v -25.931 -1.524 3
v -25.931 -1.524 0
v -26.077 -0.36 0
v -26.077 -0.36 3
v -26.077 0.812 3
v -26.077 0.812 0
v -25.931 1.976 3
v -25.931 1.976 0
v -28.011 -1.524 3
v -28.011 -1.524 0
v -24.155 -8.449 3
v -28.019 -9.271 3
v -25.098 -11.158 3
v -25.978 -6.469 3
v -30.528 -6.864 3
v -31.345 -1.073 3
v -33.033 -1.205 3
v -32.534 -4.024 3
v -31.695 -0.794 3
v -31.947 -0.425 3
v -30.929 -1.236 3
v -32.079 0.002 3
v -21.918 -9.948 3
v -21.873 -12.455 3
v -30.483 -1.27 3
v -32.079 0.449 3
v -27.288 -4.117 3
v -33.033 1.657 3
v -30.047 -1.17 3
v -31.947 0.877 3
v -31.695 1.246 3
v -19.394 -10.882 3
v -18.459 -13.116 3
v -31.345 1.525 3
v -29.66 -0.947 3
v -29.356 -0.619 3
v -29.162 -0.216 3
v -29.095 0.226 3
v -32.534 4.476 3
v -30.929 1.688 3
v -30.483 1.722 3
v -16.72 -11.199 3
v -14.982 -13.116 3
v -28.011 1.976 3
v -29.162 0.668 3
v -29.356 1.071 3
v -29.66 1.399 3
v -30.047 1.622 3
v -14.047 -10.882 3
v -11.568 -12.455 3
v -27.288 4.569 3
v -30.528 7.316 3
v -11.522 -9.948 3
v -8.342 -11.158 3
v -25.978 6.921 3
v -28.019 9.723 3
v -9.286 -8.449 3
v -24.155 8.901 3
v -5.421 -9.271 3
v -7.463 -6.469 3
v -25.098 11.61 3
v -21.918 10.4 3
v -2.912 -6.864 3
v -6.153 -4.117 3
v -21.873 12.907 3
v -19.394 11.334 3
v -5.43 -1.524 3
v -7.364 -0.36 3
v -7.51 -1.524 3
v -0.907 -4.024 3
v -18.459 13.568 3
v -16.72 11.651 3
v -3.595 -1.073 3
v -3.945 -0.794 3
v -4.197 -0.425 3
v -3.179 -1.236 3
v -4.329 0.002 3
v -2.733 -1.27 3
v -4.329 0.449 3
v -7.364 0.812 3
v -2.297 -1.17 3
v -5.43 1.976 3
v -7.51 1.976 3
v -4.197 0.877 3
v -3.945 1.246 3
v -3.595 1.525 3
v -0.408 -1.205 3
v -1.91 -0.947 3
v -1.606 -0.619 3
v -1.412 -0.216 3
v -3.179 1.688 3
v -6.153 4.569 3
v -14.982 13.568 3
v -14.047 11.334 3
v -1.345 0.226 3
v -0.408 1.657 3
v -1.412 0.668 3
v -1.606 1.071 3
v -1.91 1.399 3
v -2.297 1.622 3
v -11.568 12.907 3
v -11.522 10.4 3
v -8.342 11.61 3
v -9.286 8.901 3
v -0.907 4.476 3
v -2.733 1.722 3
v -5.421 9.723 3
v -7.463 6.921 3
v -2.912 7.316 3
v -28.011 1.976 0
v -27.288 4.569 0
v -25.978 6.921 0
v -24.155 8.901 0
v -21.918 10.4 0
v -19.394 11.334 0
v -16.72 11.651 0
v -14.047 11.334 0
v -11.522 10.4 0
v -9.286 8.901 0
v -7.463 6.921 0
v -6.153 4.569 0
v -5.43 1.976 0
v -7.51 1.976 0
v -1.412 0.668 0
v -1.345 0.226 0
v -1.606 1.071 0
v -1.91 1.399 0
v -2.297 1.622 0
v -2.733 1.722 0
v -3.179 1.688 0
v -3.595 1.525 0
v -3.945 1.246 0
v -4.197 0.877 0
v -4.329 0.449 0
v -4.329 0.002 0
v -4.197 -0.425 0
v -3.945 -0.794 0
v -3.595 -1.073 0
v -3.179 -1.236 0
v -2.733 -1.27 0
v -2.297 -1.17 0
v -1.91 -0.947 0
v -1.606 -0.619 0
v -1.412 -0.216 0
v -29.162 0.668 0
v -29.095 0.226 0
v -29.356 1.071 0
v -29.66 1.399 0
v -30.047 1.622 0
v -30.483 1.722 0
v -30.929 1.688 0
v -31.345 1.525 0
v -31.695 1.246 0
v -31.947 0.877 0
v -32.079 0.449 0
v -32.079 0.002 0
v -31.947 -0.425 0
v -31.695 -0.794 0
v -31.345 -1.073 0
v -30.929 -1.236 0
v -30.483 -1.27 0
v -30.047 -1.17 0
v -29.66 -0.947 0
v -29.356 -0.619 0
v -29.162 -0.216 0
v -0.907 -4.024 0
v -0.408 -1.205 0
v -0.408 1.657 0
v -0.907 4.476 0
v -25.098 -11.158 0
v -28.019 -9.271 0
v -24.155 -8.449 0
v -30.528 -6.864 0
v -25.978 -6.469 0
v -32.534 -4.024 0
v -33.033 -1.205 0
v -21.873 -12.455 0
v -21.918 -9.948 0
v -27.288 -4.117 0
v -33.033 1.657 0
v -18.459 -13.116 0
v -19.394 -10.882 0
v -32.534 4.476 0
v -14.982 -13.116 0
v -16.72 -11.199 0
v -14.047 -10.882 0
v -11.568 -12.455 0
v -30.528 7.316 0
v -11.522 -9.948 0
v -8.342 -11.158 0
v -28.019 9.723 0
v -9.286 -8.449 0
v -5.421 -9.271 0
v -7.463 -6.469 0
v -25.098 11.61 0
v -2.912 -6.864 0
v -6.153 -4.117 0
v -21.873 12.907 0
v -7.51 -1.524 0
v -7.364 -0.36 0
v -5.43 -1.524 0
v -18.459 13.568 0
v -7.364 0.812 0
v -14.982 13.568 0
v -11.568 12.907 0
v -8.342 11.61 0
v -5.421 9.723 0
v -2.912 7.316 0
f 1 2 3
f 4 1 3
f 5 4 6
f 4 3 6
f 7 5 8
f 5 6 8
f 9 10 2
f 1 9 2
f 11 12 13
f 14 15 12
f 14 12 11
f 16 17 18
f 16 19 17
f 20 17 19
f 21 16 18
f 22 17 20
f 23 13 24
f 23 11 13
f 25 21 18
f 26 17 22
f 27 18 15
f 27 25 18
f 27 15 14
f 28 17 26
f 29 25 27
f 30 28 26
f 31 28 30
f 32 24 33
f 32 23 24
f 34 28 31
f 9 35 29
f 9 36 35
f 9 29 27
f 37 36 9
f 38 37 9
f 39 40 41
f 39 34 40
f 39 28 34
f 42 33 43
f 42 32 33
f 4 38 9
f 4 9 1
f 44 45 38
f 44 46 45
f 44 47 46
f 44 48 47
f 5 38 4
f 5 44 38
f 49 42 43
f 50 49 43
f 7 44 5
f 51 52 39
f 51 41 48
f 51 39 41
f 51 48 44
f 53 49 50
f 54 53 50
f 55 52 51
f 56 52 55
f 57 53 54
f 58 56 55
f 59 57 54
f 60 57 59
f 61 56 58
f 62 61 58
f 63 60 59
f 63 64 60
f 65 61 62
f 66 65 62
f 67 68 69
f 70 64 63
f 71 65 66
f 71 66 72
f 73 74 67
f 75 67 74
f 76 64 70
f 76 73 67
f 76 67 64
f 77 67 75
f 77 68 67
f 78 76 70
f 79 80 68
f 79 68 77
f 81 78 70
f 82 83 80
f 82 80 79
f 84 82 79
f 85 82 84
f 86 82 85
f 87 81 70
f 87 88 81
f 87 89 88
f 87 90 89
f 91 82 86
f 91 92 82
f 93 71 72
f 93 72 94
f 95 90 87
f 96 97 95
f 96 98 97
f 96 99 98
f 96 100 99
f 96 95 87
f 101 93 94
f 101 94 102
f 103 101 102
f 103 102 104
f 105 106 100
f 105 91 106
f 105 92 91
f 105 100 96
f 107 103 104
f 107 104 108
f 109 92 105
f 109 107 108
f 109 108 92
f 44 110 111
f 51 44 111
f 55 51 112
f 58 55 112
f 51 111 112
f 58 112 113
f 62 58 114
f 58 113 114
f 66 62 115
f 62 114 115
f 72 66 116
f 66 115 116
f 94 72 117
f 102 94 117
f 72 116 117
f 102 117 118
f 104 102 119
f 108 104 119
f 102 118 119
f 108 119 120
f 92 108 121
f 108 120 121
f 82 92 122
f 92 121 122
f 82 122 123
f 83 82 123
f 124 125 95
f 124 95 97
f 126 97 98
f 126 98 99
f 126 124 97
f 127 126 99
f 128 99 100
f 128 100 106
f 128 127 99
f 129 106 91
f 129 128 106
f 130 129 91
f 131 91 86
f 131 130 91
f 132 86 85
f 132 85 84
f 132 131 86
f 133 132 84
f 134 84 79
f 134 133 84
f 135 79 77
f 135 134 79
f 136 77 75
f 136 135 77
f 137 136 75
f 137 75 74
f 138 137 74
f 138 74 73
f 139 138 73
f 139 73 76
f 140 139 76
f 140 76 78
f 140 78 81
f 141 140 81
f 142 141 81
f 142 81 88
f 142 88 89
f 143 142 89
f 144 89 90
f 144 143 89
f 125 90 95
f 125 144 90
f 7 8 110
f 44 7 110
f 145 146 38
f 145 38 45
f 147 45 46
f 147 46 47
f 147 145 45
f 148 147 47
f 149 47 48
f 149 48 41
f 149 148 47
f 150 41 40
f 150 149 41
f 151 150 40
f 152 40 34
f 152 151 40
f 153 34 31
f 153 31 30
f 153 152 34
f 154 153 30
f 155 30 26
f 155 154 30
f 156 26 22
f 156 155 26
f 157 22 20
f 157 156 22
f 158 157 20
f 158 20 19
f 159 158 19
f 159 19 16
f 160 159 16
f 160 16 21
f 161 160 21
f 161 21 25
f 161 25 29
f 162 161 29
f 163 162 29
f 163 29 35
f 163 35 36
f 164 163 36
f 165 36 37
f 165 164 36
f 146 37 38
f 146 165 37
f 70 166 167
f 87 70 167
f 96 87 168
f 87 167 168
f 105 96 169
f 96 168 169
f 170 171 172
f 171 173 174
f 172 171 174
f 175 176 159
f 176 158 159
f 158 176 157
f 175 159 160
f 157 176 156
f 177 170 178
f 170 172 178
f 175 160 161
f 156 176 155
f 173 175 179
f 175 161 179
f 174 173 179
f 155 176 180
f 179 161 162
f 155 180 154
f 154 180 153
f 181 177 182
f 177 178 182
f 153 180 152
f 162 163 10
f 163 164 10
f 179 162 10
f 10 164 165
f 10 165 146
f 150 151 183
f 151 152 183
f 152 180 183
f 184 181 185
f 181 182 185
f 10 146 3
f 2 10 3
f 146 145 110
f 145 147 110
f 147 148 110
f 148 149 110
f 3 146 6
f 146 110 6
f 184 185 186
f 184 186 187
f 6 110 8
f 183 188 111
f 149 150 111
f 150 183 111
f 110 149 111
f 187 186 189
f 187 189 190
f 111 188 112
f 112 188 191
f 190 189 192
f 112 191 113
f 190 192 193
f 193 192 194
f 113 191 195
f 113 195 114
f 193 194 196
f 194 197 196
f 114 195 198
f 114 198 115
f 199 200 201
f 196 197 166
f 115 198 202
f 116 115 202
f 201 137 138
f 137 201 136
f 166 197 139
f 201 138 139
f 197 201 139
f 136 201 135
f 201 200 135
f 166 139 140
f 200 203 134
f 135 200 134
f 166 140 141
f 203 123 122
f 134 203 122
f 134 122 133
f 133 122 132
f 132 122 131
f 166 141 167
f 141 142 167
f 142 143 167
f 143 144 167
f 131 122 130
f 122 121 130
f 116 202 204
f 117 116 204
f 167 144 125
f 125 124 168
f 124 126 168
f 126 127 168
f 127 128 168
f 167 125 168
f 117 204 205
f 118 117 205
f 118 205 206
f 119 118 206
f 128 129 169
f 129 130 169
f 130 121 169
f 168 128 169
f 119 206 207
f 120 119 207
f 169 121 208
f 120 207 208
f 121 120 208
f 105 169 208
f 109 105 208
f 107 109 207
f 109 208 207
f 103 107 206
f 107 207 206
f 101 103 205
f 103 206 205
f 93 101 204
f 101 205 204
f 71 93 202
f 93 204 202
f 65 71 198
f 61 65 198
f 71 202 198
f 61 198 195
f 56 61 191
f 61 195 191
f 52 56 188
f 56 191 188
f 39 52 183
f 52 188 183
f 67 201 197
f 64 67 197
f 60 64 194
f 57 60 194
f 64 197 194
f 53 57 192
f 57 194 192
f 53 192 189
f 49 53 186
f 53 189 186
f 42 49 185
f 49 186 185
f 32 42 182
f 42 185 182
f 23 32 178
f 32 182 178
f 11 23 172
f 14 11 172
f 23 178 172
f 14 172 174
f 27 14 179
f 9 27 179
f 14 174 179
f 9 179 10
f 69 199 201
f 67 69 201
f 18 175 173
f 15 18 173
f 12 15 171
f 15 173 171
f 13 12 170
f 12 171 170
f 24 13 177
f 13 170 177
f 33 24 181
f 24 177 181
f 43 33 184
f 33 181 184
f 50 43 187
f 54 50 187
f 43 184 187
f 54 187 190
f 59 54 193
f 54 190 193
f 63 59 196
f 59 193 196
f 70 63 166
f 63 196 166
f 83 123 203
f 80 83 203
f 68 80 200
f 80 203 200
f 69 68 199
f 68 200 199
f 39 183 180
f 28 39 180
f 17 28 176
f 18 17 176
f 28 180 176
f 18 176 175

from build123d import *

# Parameters (mm, degrees)
SKETCH1_R           = 1.5
BOSS_EXTRUDE1_DEPTH = 3


with BuildPart() as part:
    # Sketch1 → Boss-Extrude1 (new body)
    with BuildSketch(Plane.XY):
        with BuildLine():
            ThreePointArc((-32.534155724, 4.476054283), (-33.095330262, 0.22593084), (-32.534155724, -4.024192603))
            ThreePointArc((-32.534155724, -4.024192603), (-16.720330262, -13.19906916), (-0.906504801, -4.024192603))
            ThreePointArc((-0.906504801, -4.024192603), (-0.345330262, 0.22593084), (-0.906504801, 4.476054283))
            ThreePointArc((-0.906504801, 4.476054283), (-16.720330262, 13.65093084), (-32.534155724, 4.476054283))
        make_face()
        with Locations((-2.845330262, 0.22593084)):
            Circle(SKETCH1_R, mode=Mode.SUBTRACT)
        with Locations((-30.595330262, 0.22593084)):
            Circle(SKETCH1_R, mode=Mode.SUBTRACT)
        with BuildLine():
            Line((-28.010508516, -1.52406916), (-25.930548772, -1.52406916))
            ThreePointArc((-25.930548772, -1.52406916), (-26.095330262, 0.22593084), (-25.930548772, 1.97593084))
            Line((-25.930548772, 1.97593084), (-28.010508516, 1.97593084))
            ThreePointArc((-28.010508516, 1.97593084), (-16.720330262, 11.65093084), (-5.430152009, 1.97593084))
            Line((-5.430152009, 1.97593084), (-7.510111752, 1.97593084))
            ThreePointArc((-7.510111752, 1.97593084), (-7.345330262, 0.22593084), (-7.510111752, -1.52406916))
            Line((-7.510111752, -1.52406916), (-5.430152009, -1.52406916))
            ThreePointArc((-5.430152009, -1.52406916), (-16.720330262, -11.19906916), (-28.010508516, -1.52406916))
        make_face(mode=Mode.SUBTRACT)
    extrude(amount=BOSS_EXTRUDE1_DEPTH)


solid = part.part
